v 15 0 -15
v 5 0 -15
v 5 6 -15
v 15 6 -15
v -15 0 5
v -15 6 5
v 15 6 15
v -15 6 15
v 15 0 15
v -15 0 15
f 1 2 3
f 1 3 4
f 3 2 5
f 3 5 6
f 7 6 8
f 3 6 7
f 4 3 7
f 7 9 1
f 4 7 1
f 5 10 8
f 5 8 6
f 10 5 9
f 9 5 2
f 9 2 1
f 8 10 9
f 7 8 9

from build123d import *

# Parameters (mm, degrees)
SKETCH1_W           = 30
SKETCH1_H           = 30
BOSS_EXTRUDE1_DEPTH = 6
CHAMFER1_SIZE       = 20


with BuildPart() as part:
    # Sketch1 → Boss-Extrude1 (new body)
    with BuildSketch(Plane(origin=(0, 0, 0), x_dir=(1, 0, 0), z_dir=(0, 1, 0))):
        Rectangle(SKETCH1_W, SKETCH1_H)
    extrude(amount=BOSS_EXTRUDE1_DEPTH)

    # Chamfer1
    chamfer1_edges = [part.edges().sort_by_distance(p)[0] for p in [
        (-15, 3, -15),
    ]]
    chamfer(chamfer1_edges, length=CHAMFER1_SIZE)


solid = part.part
